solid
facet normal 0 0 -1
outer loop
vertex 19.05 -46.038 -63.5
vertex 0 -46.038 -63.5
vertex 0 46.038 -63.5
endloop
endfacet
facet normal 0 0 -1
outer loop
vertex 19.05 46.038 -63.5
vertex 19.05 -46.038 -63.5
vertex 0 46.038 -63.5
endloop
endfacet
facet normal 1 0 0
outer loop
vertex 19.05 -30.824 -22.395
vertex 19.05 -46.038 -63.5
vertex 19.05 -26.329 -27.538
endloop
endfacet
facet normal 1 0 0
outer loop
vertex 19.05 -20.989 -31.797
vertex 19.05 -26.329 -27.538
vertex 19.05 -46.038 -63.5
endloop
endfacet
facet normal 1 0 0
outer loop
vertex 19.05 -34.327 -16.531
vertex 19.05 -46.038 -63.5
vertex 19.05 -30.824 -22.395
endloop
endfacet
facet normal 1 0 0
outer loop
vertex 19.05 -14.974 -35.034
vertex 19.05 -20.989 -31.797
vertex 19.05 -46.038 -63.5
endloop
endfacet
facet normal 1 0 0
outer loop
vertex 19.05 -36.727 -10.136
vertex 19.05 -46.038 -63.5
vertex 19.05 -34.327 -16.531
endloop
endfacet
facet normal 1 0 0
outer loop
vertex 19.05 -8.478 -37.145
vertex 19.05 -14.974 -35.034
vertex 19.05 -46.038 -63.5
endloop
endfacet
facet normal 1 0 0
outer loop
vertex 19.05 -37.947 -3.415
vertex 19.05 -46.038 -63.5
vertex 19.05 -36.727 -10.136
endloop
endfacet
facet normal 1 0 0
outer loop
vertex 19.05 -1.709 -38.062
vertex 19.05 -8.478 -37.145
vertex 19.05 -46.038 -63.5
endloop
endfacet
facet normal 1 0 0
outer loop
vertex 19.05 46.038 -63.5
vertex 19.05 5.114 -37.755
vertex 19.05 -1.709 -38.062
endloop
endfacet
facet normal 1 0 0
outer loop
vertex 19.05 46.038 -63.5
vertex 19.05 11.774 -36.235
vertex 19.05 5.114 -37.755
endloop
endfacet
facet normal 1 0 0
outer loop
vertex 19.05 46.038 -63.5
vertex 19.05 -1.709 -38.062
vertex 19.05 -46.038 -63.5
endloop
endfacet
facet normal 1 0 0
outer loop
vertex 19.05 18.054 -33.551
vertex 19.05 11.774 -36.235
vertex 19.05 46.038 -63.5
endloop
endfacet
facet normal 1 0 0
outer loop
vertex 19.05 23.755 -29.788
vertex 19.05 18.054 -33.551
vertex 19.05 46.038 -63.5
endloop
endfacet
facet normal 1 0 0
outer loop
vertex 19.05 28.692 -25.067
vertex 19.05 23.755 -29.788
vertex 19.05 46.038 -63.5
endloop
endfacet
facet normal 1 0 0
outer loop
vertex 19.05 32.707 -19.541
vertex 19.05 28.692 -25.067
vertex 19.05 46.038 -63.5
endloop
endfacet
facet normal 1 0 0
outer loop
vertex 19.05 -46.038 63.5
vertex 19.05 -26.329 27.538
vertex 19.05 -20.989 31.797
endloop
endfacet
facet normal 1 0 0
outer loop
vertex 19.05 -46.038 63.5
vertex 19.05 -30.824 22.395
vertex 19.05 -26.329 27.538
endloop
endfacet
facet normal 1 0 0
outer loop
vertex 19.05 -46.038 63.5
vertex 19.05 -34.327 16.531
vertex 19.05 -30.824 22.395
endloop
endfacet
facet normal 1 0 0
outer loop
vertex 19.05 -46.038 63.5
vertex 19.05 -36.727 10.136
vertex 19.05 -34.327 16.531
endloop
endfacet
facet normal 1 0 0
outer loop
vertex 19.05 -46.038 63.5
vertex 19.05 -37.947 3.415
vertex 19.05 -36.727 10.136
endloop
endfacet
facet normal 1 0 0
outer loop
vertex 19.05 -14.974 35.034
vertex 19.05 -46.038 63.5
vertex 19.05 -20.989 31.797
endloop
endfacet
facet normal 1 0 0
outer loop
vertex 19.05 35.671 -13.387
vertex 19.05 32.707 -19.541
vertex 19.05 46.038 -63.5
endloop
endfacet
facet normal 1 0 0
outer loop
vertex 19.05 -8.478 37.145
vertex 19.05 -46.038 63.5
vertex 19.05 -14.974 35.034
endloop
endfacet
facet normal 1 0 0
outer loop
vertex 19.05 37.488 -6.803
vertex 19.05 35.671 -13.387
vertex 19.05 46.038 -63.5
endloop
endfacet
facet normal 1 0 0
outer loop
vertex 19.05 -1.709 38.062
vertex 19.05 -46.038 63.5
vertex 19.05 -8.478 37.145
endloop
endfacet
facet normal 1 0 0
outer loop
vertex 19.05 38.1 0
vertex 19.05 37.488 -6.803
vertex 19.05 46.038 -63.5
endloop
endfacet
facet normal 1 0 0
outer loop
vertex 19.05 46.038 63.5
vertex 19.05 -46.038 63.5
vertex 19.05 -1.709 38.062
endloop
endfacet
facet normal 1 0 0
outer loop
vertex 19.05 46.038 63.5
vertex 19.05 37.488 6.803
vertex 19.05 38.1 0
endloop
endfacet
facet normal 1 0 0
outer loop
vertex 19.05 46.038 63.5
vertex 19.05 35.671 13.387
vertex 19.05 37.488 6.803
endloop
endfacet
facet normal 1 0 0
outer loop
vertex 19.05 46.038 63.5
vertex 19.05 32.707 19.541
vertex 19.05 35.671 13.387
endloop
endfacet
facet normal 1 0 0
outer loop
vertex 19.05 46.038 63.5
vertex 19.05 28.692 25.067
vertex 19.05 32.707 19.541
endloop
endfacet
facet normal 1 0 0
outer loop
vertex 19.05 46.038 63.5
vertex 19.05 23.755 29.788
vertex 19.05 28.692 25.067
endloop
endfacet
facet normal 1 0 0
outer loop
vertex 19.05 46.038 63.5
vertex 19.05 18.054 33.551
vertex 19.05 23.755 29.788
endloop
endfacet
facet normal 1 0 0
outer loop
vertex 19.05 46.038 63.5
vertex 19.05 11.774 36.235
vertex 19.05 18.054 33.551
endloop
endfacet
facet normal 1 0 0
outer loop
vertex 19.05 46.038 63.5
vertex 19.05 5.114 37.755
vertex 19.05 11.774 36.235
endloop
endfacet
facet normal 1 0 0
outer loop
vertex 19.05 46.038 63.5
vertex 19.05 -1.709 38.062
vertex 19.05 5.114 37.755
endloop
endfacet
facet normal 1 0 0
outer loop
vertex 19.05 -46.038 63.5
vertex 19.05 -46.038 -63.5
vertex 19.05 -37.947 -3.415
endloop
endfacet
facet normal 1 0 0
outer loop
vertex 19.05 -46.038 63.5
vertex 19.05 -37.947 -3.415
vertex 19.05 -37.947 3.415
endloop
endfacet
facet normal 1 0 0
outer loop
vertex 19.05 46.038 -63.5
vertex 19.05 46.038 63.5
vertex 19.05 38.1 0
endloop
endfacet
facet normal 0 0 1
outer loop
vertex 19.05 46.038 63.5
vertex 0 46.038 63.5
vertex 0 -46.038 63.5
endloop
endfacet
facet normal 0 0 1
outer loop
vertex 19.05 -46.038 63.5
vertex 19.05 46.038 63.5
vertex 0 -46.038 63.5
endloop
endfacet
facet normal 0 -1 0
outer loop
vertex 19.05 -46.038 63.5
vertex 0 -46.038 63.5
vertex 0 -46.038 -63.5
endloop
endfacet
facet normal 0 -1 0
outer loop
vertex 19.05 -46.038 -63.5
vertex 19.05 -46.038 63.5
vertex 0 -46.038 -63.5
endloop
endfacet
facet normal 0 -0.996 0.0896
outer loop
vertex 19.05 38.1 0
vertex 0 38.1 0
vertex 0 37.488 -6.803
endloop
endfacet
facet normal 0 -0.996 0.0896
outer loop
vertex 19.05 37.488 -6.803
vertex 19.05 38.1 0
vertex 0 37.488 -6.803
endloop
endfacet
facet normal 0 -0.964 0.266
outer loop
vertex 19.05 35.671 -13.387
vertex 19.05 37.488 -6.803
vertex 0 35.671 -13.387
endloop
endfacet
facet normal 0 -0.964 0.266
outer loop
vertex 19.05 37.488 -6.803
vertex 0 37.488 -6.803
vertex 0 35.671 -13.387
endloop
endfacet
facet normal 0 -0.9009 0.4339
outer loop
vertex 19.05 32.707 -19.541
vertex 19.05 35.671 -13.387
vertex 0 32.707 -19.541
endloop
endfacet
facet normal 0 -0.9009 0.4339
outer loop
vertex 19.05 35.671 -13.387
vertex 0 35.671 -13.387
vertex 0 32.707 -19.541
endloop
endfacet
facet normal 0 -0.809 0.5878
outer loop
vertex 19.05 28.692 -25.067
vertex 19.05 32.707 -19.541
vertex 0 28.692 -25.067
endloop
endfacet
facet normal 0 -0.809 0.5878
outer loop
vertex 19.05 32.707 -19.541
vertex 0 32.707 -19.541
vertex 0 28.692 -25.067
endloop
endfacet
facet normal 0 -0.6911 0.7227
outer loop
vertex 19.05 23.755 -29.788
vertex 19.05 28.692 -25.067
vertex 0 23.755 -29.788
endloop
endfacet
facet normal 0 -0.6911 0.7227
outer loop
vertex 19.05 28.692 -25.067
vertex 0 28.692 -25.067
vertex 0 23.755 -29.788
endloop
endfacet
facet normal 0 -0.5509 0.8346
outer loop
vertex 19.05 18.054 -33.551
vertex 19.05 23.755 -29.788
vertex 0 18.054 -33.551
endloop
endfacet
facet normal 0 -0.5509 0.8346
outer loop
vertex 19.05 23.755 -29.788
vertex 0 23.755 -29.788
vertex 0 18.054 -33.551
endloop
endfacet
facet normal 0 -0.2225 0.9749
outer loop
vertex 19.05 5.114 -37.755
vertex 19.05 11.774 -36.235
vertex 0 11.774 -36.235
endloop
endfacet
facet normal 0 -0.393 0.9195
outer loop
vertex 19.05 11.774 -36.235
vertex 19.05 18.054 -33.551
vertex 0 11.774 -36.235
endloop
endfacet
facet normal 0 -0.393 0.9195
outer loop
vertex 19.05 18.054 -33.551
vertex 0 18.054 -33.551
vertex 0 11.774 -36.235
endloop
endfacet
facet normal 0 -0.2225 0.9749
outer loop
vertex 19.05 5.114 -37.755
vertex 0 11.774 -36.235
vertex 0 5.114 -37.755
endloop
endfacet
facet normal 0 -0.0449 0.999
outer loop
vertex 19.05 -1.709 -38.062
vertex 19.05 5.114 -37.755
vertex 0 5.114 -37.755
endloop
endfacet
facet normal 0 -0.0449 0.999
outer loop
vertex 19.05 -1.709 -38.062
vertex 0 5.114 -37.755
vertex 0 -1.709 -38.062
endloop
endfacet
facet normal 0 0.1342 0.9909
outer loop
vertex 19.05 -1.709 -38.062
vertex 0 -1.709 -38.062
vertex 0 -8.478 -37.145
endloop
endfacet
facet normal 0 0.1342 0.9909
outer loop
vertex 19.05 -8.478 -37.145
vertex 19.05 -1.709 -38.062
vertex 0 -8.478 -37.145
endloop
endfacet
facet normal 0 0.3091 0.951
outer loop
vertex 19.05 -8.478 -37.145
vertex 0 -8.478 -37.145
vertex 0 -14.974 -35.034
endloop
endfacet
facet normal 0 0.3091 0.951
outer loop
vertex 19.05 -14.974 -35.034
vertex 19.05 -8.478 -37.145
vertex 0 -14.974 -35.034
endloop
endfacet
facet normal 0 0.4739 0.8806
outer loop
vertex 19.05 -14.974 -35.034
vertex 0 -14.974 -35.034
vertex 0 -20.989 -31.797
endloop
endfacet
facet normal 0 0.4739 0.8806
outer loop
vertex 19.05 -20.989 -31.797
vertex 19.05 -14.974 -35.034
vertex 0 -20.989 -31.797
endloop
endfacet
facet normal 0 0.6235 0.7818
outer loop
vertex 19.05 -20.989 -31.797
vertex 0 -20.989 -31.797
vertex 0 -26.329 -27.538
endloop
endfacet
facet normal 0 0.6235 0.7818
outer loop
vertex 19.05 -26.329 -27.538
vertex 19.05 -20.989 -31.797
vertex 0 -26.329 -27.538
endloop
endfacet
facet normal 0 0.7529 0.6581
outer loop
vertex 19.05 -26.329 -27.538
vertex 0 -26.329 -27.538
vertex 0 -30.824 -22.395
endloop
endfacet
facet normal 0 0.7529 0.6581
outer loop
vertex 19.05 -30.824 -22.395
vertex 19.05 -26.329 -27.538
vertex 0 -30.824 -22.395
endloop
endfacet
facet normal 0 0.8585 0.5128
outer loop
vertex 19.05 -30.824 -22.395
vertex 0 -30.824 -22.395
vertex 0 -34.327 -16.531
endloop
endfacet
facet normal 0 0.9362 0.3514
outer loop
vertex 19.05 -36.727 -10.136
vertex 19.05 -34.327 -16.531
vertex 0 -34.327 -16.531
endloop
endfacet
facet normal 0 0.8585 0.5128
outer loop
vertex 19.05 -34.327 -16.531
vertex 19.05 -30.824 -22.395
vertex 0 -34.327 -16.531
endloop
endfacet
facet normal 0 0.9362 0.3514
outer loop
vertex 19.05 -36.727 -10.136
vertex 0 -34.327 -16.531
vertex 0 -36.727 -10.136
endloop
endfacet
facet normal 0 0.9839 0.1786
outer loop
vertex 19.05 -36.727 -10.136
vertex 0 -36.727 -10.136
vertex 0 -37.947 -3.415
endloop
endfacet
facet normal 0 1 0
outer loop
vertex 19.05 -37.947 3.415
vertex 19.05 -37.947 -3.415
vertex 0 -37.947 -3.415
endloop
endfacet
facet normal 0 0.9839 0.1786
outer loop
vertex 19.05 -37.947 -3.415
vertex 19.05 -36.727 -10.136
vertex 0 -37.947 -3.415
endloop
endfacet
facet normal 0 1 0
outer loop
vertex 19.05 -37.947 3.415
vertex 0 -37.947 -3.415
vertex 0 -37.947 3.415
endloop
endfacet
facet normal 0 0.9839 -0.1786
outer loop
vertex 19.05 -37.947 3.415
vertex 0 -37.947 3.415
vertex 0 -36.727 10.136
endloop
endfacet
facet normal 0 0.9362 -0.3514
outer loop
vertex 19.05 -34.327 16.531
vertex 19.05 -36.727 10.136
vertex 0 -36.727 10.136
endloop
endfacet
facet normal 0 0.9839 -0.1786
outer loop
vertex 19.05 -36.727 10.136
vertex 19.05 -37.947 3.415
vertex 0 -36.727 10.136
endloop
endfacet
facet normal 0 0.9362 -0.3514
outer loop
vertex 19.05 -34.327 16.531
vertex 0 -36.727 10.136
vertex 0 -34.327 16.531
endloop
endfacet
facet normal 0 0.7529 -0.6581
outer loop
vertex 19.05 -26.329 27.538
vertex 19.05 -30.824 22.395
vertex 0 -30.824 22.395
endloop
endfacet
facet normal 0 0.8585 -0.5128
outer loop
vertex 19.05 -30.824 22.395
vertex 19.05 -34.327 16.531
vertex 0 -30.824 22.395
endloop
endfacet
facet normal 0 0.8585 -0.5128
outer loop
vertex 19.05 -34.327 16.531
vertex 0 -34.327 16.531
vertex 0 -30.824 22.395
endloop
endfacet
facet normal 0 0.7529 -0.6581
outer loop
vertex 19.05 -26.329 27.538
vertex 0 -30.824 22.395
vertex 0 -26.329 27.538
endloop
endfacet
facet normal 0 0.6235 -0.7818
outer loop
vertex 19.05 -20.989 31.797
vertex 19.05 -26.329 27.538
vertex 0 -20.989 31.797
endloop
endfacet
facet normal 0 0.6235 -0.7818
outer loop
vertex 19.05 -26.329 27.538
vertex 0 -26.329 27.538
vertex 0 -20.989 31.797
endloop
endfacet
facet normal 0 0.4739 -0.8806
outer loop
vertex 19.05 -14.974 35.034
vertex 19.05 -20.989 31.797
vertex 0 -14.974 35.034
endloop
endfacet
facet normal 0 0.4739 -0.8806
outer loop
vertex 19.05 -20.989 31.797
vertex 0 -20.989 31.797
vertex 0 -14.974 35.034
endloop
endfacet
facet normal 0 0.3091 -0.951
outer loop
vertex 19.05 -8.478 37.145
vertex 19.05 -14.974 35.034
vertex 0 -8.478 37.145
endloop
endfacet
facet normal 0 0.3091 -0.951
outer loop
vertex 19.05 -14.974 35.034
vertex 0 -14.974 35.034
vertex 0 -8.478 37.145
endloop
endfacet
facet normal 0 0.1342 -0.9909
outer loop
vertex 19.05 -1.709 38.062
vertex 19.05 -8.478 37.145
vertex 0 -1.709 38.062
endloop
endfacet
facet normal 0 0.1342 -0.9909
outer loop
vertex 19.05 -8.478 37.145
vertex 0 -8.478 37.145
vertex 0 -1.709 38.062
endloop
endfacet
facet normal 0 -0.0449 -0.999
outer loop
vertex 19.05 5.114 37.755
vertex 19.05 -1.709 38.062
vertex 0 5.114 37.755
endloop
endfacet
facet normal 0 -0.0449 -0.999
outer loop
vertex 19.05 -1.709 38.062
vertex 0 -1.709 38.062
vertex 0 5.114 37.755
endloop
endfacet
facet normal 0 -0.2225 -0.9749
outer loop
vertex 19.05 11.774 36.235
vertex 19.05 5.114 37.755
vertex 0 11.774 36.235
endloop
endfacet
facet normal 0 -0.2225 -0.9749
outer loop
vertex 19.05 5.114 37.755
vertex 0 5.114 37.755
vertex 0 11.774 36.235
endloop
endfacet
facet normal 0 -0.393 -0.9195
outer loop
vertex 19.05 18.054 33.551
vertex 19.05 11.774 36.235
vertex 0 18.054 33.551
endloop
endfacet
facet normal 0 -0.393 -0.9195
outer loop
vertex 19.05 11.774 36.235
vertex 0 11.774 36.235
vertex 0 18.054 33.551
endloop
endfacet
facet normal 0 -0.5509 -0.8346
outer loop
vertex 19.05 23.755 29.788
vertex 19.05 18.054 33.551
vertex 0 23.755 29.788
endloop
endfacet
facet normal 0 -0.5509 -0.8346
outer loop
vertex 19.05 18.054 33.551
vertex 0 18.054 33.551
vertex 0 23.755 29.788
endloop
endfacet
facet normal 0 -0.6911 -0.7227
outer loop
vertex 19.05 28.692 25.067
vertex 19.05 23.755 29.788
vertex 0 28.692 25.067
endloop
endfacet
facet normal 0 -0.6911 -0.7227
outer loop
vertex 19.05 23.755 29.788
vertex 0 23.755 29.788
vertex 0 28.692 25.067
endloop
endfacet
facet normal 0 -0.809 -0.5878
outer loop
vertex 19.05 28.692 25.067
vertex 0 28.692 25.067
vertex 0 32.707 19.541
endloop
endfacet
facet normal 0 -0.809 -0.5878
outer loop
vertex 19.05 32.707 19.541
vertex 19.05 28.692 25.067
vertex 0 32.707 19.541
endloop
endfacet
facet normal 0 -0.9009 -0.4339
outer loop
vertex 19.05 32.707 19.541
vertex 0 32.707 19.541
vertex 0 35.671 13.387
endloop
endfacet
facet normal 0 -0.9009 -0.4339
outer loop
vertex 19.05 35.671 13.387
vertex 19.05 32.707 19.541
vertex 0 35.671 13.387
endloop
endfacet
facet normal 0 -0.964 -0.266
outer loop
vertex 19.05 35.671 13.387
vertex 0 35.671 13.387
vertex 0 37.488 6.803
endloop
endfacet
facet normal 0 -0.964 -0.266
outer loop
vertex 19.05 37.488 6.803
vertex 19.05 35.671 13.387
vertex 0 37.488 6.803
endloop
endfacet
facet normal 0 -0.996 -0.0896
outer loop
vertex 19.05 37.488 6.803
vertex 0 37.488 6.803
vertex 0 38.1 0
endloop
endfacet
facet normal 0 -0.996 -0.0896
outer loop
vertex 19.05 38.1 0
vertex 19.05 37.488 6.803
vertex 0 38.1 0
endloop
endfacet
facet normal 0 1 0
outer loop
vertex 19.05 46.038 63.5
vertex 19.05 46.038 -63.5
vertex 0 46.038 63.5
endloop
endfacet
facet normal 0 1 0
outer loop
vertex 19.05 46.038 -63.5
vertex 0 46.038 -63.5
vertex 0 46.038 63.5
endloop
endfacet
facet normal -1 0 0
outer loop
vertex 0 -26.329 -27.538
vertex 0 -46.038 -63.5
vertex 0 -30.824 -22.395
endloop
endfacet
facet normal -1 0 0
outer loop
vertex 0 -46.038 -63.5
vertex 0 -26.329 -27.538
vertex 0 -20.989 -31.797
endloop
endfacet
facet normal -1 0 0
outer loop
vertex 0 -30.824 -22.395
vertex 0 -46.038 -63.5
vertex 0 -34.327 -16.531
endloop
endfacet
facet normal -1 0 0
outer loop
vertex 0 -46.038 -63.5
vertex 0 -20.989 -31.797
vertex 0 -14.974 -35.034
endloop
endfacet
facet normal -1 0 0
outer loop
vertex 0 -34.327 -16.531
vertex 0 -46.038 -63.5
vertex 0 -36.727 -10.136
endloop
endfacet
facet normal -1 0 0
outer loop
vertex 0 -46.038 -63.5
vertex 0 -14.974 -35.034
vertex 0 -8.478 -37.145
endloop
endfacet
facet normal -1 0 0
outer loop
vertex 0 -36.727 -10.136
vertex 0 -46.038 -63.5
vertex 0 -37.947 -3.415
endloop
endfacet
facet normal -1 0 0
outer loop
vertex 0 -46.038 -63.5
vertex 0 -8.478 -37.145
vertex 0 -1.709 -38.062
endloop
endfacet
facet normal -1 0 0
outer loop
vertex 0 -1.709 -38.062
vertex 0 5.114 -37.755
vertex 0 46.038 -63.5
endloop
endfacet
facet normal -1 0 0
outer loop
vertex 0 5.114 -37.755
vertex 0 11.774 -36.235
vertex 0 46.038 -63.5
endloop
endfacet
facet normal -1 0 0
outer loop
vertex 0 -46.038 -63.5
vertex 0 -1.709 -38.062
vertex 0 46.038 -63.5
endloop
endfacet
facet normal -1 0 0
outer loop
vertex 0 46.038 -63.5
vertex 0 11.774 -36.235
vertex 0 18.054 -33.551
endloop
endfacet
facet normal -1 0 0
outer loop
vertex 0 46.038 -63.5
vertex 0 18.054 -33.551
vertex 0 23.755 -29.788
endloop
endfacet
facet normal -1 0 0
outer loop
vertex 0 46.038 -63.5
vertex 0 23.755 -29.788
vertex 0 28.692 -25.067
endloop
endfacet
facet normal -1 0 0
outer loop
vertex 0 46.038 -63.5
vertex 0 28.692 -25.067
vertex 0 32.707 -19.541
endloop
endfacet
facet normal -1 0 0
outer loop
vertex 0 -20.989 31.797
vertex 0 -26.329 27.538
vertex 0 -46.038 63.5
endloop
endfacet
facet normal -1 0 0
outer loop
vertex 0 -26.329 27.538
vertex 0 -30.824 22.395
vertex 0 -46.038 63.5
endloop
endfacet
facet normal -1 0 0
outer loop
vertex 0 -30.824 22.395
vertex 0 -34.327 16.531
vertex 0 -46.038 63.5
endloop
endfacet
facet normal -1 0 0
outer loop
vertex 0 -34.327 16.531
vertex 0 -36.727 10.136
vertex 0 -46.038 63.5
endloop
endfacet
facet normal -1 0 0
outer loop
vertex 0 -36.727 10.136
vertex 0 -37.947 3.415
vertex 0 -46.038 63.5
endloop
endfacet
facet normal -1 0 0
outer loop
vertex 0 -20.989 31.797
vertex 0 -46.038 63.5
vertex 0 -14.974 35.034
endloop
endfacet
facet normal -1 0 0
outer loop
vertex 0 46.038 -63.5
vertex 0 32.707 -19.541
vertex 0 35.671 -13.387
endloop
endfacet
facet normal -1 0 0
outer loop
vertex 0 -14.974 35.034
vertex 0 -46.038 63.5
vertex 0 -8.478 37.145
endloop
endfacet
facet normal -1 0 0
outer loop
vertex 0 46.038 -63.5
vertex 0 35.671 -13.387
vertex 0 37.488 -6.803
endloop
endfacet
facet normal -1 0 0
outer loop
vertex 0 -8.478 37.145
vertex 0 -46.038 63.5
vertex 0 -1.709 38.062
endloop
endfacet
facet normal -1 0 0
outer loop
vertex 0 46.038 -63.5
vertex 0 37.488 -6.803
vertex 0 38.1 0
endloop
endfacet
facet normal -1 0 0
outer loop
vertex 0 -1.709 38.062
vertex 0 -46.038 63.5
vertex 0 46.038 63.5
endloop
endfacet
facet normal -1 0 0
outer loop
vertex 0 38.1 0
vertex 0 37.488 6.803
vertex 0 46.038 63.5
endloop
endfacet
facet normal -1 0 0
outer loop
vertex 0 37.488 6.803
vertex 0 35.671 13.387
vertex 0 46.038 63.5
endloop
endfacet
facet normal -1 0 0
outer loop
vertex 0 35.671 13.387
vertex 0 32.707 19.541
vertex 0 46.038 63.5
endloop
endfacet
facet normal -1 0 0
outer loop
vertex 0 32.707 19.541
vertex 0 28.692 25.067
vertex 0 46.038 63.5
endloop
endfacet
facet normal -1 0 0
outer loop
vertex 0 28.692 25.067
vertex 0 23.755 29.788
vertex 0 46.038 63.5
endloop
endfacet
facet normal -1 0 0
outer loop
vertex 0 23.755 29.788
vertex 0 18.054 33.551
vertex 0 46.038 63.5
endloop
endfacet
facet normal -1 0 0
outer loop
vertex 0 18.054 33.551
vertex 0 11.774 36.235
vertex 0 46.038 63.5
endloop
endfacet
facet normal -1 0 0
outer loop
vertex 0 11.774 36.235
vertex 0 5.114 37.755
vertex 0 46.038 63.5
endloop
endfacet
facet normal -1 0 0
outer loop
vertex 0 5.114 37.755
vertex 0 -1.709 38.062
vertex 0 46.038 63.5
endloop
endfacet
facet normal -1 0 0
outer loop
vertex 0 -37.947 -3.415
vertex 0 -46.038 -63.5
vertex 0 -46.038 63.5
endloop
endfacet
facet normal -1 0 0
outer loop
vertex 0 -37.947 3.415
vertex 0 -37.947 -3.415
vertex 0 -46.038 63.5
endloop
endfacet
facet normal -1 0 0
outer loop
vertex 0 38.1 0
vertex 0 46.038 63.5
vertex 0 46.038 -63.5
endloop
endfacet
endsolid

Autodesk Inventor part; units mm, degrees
ref_plane "YZ Plane" through (0, 0, 0) normal (1, 0, 0) x (0, 1, 0)
ref_plane "XZ Plane" through (0, 0, 0) normal (0, 1, 0) x (-1, 0, 0)
ref_plane "XY Plane" through (0, 0, 0) normal (0, 0, 1) x (1, 0, 0)
sketch "Sketch1" plane through (0, 0, 0) normal (1, 0, 0) x (0, 1, 0)
  line L0 (46.0375, 63.5) -> (-46.0375, 63.5)
  line L1 (-46.0375, 63.5) -> (-46.0375, -63.5)
  line L2 (-46.0375, -63.5) -> (46.0375, -63.5)
  line L3 (46.0375, -63.5) -> (46.0375, 63.5)
  line L4 (46.0375, 63.5) -> (-46.0375, -63.5) construction
  line L5 (-46.0375, 63.5) -> (46.0375, -63.5) construction
  circle A0 centre (0, 0) radius 38.1
  dimension "d0" = 92.075
  dimension "d1" = 127
  dimension "d4" = 76.2
extrude "Extrusion1" add sketch "Sketch1" along normal blind 19.05
